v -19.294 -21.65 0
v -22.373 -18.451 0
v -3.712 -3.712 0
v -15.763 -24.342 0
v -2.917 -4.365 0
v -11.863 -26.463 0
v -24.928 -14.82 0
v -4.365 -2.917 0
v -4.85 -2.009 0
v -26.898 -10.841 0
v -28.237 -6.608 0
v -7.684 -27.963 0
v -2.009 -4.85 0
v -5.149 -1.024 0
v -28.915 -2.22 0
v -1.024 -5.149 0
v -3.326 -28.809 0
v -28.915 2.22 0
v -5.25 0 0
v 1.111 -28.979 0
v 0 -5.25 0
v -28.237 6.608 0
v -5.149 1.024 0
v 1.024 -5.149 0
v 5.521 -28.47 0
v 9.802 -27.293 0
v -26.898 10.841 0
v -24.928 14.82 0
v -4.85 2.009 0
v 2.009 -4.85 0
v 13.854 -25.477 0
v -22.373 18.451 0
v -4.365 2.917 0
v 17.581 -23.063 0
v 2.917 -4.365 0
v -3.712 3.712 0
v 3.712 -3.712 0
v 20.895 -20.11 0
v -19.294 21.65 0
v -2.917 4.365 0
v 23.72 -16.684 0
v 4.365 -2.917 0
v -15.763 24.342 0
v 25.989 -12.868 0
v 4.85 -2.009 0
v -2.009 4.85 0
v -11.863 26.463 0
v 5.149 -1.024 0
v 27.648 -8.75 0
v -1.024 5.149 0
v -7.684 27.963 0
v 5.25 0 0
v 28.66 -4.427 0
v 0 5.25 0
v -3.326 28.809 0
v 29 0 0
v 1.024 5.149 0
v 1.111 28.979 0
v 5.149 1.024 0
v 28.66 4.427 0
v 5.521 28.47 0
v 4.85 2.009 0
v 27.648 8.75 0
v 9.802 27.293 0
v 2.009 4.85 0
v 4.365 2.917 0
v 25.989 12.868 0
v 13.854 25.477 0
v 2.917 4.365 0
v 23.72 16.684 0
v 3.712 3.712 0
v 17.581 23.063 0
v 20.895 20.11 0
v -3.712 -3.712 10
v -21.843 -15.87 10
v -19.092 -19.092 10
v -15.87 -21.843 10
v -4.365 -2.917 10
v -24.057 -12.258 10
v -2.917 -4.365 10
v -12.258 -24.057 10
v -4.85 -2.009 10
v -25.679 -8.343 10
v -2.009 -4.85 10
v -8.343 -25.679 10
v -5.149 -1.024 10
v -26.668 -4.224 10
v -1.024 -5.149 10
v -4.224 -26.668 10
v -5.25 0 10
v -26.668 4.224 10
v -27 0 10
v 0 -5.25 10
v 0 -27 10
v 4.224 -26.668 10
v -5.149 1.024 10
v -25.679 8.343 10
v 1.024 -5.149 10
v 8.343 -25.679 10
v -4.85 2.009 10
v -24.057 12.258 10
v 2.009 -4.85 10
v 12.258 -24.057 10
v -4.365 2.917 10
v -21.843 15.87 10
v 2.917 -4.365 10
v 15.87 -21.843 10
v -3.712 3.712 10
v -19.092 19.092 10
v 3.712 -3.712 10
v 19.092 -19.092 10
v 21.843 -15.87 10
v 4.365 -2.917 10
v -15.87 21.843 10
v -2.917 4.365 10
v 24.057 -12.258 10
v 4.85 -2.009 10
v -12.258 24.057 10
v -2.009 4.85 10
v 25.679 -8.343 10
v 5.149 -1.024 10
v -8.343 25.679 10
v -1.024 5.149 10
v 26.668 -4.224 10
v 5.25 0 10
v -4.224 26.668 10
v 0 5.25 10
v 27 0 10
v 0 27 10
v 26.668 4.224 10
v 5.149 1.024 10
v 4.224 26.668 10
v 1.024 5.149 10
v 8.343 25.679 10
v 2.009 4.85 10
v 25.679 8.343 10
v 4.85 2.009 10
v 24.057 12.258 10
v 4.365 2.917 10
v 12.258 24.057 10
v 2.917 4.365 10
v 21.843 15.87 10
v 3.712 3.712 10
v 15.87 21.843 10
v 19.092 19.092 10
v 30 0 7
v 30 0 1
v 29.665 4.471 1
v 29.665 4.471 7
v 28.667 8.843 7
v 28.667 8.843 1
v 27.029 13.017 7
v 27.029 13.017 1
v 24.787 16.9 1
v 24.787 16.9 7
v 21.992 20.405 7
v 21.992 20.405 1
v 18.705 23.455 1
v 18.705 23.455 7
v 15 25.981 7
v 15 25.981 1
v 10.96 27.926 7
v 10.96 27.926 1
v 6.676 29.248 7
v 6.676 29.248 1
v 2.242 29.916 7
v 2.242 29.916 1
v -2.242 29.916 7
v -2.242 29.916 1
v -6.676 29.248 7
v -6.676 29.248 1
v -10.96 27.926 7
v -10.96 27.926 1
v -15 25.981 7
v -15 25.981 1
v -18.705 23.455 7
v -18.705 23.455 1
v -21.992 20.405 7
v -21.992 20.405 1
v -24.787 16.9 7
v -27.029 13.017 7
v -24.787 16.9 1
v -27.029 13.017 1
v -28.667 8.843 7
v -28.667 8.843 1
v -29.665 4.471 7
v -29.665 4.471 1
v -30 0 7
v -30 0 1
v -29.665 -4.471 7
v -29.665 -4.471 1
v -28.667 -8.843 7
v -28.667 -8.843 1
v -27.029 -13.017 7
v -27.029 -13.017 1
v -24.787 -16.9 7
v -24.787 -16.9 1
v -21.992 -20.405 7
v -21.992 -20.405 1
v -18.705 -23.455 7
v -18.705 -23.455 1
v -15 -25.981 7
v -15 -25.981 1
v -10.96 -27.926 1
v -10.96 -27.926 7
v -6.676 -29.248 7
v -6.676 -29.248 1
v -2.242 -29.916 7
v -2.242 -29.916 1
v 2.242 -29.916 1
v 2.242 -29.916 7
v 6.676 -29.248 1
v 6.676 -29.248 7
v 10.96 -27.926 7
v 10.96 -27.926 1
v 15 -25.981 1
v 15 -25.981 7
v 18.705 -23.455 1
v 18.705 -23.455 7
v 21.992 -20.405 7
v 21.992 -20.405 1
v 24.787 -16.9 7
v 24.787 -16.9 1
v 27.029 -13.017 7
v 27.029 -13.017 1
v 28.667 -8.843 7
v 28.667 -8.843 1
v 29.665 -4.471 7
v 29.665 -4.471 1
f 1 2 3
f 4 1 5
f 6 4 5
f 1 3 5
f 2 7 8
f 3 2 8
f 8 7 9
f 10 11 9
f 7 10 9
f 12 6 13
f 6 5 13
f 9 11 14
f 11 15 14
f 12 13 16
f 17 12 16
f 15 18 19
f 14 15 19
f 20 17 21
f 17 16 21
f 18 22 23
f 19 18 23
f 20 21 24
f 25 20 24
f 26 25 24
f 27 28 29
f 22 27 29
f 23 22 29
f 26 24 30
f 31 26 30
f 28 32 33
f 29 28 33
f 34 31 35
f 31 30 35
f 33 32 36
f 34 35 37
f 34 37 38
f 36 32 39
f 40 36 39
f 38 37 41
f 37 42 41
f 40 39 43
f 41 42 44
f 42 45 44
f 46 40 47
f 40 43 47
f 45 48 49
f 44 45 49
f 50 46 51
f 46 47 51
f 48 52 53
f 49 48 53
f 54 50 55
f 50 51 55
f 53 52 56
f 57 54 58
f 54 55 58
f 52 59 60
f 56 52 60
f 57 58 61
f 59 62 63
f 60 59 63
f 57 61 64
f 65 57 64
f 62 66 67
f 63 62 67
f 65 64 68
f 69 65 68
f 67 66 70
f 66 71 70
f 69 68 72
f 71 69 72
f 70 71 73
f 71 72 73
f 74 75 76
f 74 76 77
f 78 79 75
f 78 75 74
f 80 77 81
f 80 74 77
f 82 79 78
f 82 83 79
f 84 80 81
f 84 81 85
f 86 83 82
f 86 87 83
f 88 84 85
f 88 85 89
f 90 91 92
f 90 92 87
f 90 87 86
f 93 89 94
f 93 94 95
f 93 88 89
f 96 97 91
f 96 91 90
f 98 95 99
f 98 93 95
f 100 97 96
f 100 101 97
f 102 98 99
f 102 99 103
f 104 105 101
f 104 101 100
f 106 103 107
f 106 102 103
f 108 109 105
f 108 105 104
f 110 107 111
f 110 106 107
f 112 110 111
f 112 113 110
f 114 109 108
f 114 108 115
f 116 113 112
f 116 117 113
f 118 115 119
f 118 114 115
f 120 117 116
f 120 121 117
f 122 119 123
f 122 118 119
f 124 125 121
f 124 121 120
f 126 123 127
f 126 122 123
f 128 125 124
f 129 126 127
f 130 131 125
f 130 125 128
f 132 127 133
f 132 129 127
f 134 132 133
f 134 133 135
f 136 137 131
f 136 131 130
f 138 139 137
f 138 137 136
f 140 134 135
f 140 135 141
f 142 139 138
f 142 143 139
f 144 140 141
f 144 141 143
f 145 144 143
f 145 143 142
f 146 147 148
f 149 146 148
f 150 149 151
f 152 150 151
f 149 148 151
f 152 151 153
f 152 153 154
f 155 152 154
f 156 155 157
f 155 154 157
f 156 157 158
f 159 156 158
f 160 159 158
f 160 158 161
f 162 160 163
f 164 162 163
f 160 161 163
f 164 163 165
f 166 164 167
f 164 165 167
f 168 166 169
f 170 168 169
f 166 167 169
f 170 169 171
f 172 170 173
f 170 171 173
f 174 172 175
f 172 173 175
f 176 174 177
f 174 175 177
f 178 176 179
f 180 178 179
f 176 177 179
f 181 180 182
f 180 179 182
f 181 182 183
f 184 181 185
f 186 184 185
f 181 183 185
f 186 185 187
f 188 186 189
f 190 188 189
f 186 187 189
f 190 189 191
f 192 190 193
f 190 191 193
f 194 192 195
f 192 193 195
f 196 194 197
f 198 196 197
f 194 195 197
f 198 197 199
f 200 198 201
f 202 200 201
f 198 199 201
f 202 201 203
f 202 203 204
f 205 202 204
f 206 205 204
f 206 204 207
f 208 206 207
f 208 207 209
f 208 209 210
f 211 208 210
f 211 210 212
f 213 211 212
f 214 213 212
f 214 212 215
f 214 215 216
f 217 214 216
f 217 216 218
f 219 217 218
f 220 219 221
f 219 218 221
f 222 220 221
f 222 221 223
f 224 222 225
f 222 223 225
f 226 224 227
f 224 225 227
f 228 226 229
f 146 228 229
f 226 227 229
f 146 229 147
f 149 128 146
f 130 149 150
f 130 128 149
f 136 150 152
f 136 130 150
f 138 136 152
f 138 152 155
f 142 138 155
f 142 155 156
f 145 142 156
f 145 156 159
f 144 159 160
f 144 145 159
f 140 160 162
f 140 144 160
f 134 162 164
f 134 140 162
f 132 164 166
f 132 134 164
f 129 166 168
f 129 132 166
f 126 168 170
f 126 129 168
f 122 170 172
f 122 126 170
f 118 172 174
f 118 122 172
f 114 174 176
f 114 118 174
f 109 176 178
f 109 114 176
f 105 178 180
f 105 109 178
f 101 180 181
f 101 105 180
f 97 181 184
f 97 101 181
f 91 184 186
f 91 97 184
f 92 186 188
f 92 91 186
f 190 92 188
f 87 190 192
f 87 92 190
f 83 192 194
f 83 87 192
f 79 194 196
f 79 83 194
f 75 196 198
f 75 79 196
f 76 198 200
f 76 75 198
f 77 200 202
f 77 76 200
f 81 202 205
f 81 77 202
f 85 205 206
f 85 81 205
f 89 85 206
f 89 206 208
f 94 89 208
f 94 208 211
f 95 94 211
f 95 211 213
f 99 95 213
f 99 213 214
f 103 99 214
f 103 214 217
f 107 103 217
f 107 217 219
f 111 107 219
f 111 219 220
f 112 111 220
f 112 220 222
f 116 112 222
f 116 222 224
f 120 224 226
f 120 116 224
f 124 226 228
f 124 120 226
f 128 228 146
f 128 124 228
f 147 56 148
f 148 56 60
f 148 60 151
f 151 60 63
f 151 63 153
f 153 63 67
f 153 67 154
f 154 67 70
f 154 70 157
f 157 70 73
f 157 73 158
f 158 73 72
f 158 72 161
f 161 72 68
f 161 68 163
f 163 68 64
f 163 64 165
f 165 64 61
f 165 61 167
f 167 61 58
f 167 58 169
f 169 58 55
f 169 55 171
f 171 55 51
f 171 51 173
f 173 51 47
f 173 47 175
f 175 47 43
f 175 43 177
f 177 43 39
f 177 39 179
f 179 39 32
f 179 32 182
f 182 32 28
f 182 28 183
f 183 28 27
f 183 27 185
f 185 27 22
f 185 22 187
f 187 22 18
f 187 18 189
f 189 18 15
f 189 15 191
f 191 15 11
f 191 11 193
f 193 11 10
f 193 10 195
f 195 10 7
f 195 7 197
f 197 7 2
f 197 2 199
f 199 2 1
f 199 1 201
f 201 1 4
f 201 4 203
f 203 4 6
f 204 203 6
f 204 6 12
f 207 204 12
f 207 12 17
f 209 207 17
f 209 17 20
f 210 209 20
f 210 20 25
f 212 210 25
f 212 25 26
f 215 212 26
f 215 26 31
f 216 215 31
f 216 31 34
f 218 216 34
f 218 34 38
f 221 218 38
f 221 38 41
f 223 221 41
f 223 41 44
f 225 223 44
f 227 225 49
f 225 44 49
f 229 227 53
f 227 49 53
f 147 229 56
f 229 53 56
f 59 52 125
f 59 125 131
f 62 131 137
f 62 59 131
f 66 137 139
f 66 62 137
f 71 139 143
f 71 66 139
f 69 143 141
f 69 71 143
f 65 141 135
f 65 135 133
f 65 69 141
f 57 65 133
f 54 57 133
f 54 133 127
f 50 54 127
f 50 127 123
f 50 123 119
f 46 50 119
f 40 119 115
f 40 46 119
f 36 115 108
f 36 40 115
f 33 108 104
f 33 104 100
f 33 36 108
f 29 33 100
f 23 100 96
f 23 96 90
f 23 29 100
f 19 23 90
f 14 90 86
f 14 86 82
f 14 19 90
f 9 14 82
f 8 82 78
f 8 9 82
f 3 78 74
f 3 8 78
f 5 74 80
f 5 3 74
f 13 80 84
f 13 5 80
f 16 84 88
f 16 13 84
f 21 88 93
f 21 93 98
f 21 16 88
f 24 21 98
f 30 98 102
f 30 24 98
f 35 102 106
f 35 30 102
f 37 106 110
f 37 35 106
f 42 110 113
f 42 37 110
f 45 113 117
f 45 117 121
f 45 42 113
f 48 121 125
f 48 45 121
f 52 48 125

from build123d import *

# Parameters (mm, degrees)
SKETCH_2_R      = 30
SKETCH_2_R_2    = 5.25
EXTRUDE_1_DEPTH = 10
CHAMFER_1_SIZE  = 3
CHAMFER_2_SIZE  = 1


with BuildPart() as part:
    # Эскиз2 → Бобышка-Вытянуть1 (new body)
    with BuildSketch(Plane.XY):
        Circle(SKETCH_2_R)
        Circle(SKETCH_2_R_2, mode=Mode.SUBTRACT)
    extrude(amount=EXTRUDE_1_DEPTH)

    # Фаска1
    chamfer_1_edges = [part.edges().sort_by_distance(p)[0] for p in [
        (-30, 0, 10),
    ]]
    chamfer(chamfer_1_edges, length=CHAMFER_1_SIZE)

    # Фаска2
    chamfer_2_edges = [part.edges().sort_by_distance(p)[0] for p in [
        (-30, 0, 0),
    ]]
    chamfer(chamfer_2_edges, length=CHAMFER_2_SIZE)


solid = part.part
